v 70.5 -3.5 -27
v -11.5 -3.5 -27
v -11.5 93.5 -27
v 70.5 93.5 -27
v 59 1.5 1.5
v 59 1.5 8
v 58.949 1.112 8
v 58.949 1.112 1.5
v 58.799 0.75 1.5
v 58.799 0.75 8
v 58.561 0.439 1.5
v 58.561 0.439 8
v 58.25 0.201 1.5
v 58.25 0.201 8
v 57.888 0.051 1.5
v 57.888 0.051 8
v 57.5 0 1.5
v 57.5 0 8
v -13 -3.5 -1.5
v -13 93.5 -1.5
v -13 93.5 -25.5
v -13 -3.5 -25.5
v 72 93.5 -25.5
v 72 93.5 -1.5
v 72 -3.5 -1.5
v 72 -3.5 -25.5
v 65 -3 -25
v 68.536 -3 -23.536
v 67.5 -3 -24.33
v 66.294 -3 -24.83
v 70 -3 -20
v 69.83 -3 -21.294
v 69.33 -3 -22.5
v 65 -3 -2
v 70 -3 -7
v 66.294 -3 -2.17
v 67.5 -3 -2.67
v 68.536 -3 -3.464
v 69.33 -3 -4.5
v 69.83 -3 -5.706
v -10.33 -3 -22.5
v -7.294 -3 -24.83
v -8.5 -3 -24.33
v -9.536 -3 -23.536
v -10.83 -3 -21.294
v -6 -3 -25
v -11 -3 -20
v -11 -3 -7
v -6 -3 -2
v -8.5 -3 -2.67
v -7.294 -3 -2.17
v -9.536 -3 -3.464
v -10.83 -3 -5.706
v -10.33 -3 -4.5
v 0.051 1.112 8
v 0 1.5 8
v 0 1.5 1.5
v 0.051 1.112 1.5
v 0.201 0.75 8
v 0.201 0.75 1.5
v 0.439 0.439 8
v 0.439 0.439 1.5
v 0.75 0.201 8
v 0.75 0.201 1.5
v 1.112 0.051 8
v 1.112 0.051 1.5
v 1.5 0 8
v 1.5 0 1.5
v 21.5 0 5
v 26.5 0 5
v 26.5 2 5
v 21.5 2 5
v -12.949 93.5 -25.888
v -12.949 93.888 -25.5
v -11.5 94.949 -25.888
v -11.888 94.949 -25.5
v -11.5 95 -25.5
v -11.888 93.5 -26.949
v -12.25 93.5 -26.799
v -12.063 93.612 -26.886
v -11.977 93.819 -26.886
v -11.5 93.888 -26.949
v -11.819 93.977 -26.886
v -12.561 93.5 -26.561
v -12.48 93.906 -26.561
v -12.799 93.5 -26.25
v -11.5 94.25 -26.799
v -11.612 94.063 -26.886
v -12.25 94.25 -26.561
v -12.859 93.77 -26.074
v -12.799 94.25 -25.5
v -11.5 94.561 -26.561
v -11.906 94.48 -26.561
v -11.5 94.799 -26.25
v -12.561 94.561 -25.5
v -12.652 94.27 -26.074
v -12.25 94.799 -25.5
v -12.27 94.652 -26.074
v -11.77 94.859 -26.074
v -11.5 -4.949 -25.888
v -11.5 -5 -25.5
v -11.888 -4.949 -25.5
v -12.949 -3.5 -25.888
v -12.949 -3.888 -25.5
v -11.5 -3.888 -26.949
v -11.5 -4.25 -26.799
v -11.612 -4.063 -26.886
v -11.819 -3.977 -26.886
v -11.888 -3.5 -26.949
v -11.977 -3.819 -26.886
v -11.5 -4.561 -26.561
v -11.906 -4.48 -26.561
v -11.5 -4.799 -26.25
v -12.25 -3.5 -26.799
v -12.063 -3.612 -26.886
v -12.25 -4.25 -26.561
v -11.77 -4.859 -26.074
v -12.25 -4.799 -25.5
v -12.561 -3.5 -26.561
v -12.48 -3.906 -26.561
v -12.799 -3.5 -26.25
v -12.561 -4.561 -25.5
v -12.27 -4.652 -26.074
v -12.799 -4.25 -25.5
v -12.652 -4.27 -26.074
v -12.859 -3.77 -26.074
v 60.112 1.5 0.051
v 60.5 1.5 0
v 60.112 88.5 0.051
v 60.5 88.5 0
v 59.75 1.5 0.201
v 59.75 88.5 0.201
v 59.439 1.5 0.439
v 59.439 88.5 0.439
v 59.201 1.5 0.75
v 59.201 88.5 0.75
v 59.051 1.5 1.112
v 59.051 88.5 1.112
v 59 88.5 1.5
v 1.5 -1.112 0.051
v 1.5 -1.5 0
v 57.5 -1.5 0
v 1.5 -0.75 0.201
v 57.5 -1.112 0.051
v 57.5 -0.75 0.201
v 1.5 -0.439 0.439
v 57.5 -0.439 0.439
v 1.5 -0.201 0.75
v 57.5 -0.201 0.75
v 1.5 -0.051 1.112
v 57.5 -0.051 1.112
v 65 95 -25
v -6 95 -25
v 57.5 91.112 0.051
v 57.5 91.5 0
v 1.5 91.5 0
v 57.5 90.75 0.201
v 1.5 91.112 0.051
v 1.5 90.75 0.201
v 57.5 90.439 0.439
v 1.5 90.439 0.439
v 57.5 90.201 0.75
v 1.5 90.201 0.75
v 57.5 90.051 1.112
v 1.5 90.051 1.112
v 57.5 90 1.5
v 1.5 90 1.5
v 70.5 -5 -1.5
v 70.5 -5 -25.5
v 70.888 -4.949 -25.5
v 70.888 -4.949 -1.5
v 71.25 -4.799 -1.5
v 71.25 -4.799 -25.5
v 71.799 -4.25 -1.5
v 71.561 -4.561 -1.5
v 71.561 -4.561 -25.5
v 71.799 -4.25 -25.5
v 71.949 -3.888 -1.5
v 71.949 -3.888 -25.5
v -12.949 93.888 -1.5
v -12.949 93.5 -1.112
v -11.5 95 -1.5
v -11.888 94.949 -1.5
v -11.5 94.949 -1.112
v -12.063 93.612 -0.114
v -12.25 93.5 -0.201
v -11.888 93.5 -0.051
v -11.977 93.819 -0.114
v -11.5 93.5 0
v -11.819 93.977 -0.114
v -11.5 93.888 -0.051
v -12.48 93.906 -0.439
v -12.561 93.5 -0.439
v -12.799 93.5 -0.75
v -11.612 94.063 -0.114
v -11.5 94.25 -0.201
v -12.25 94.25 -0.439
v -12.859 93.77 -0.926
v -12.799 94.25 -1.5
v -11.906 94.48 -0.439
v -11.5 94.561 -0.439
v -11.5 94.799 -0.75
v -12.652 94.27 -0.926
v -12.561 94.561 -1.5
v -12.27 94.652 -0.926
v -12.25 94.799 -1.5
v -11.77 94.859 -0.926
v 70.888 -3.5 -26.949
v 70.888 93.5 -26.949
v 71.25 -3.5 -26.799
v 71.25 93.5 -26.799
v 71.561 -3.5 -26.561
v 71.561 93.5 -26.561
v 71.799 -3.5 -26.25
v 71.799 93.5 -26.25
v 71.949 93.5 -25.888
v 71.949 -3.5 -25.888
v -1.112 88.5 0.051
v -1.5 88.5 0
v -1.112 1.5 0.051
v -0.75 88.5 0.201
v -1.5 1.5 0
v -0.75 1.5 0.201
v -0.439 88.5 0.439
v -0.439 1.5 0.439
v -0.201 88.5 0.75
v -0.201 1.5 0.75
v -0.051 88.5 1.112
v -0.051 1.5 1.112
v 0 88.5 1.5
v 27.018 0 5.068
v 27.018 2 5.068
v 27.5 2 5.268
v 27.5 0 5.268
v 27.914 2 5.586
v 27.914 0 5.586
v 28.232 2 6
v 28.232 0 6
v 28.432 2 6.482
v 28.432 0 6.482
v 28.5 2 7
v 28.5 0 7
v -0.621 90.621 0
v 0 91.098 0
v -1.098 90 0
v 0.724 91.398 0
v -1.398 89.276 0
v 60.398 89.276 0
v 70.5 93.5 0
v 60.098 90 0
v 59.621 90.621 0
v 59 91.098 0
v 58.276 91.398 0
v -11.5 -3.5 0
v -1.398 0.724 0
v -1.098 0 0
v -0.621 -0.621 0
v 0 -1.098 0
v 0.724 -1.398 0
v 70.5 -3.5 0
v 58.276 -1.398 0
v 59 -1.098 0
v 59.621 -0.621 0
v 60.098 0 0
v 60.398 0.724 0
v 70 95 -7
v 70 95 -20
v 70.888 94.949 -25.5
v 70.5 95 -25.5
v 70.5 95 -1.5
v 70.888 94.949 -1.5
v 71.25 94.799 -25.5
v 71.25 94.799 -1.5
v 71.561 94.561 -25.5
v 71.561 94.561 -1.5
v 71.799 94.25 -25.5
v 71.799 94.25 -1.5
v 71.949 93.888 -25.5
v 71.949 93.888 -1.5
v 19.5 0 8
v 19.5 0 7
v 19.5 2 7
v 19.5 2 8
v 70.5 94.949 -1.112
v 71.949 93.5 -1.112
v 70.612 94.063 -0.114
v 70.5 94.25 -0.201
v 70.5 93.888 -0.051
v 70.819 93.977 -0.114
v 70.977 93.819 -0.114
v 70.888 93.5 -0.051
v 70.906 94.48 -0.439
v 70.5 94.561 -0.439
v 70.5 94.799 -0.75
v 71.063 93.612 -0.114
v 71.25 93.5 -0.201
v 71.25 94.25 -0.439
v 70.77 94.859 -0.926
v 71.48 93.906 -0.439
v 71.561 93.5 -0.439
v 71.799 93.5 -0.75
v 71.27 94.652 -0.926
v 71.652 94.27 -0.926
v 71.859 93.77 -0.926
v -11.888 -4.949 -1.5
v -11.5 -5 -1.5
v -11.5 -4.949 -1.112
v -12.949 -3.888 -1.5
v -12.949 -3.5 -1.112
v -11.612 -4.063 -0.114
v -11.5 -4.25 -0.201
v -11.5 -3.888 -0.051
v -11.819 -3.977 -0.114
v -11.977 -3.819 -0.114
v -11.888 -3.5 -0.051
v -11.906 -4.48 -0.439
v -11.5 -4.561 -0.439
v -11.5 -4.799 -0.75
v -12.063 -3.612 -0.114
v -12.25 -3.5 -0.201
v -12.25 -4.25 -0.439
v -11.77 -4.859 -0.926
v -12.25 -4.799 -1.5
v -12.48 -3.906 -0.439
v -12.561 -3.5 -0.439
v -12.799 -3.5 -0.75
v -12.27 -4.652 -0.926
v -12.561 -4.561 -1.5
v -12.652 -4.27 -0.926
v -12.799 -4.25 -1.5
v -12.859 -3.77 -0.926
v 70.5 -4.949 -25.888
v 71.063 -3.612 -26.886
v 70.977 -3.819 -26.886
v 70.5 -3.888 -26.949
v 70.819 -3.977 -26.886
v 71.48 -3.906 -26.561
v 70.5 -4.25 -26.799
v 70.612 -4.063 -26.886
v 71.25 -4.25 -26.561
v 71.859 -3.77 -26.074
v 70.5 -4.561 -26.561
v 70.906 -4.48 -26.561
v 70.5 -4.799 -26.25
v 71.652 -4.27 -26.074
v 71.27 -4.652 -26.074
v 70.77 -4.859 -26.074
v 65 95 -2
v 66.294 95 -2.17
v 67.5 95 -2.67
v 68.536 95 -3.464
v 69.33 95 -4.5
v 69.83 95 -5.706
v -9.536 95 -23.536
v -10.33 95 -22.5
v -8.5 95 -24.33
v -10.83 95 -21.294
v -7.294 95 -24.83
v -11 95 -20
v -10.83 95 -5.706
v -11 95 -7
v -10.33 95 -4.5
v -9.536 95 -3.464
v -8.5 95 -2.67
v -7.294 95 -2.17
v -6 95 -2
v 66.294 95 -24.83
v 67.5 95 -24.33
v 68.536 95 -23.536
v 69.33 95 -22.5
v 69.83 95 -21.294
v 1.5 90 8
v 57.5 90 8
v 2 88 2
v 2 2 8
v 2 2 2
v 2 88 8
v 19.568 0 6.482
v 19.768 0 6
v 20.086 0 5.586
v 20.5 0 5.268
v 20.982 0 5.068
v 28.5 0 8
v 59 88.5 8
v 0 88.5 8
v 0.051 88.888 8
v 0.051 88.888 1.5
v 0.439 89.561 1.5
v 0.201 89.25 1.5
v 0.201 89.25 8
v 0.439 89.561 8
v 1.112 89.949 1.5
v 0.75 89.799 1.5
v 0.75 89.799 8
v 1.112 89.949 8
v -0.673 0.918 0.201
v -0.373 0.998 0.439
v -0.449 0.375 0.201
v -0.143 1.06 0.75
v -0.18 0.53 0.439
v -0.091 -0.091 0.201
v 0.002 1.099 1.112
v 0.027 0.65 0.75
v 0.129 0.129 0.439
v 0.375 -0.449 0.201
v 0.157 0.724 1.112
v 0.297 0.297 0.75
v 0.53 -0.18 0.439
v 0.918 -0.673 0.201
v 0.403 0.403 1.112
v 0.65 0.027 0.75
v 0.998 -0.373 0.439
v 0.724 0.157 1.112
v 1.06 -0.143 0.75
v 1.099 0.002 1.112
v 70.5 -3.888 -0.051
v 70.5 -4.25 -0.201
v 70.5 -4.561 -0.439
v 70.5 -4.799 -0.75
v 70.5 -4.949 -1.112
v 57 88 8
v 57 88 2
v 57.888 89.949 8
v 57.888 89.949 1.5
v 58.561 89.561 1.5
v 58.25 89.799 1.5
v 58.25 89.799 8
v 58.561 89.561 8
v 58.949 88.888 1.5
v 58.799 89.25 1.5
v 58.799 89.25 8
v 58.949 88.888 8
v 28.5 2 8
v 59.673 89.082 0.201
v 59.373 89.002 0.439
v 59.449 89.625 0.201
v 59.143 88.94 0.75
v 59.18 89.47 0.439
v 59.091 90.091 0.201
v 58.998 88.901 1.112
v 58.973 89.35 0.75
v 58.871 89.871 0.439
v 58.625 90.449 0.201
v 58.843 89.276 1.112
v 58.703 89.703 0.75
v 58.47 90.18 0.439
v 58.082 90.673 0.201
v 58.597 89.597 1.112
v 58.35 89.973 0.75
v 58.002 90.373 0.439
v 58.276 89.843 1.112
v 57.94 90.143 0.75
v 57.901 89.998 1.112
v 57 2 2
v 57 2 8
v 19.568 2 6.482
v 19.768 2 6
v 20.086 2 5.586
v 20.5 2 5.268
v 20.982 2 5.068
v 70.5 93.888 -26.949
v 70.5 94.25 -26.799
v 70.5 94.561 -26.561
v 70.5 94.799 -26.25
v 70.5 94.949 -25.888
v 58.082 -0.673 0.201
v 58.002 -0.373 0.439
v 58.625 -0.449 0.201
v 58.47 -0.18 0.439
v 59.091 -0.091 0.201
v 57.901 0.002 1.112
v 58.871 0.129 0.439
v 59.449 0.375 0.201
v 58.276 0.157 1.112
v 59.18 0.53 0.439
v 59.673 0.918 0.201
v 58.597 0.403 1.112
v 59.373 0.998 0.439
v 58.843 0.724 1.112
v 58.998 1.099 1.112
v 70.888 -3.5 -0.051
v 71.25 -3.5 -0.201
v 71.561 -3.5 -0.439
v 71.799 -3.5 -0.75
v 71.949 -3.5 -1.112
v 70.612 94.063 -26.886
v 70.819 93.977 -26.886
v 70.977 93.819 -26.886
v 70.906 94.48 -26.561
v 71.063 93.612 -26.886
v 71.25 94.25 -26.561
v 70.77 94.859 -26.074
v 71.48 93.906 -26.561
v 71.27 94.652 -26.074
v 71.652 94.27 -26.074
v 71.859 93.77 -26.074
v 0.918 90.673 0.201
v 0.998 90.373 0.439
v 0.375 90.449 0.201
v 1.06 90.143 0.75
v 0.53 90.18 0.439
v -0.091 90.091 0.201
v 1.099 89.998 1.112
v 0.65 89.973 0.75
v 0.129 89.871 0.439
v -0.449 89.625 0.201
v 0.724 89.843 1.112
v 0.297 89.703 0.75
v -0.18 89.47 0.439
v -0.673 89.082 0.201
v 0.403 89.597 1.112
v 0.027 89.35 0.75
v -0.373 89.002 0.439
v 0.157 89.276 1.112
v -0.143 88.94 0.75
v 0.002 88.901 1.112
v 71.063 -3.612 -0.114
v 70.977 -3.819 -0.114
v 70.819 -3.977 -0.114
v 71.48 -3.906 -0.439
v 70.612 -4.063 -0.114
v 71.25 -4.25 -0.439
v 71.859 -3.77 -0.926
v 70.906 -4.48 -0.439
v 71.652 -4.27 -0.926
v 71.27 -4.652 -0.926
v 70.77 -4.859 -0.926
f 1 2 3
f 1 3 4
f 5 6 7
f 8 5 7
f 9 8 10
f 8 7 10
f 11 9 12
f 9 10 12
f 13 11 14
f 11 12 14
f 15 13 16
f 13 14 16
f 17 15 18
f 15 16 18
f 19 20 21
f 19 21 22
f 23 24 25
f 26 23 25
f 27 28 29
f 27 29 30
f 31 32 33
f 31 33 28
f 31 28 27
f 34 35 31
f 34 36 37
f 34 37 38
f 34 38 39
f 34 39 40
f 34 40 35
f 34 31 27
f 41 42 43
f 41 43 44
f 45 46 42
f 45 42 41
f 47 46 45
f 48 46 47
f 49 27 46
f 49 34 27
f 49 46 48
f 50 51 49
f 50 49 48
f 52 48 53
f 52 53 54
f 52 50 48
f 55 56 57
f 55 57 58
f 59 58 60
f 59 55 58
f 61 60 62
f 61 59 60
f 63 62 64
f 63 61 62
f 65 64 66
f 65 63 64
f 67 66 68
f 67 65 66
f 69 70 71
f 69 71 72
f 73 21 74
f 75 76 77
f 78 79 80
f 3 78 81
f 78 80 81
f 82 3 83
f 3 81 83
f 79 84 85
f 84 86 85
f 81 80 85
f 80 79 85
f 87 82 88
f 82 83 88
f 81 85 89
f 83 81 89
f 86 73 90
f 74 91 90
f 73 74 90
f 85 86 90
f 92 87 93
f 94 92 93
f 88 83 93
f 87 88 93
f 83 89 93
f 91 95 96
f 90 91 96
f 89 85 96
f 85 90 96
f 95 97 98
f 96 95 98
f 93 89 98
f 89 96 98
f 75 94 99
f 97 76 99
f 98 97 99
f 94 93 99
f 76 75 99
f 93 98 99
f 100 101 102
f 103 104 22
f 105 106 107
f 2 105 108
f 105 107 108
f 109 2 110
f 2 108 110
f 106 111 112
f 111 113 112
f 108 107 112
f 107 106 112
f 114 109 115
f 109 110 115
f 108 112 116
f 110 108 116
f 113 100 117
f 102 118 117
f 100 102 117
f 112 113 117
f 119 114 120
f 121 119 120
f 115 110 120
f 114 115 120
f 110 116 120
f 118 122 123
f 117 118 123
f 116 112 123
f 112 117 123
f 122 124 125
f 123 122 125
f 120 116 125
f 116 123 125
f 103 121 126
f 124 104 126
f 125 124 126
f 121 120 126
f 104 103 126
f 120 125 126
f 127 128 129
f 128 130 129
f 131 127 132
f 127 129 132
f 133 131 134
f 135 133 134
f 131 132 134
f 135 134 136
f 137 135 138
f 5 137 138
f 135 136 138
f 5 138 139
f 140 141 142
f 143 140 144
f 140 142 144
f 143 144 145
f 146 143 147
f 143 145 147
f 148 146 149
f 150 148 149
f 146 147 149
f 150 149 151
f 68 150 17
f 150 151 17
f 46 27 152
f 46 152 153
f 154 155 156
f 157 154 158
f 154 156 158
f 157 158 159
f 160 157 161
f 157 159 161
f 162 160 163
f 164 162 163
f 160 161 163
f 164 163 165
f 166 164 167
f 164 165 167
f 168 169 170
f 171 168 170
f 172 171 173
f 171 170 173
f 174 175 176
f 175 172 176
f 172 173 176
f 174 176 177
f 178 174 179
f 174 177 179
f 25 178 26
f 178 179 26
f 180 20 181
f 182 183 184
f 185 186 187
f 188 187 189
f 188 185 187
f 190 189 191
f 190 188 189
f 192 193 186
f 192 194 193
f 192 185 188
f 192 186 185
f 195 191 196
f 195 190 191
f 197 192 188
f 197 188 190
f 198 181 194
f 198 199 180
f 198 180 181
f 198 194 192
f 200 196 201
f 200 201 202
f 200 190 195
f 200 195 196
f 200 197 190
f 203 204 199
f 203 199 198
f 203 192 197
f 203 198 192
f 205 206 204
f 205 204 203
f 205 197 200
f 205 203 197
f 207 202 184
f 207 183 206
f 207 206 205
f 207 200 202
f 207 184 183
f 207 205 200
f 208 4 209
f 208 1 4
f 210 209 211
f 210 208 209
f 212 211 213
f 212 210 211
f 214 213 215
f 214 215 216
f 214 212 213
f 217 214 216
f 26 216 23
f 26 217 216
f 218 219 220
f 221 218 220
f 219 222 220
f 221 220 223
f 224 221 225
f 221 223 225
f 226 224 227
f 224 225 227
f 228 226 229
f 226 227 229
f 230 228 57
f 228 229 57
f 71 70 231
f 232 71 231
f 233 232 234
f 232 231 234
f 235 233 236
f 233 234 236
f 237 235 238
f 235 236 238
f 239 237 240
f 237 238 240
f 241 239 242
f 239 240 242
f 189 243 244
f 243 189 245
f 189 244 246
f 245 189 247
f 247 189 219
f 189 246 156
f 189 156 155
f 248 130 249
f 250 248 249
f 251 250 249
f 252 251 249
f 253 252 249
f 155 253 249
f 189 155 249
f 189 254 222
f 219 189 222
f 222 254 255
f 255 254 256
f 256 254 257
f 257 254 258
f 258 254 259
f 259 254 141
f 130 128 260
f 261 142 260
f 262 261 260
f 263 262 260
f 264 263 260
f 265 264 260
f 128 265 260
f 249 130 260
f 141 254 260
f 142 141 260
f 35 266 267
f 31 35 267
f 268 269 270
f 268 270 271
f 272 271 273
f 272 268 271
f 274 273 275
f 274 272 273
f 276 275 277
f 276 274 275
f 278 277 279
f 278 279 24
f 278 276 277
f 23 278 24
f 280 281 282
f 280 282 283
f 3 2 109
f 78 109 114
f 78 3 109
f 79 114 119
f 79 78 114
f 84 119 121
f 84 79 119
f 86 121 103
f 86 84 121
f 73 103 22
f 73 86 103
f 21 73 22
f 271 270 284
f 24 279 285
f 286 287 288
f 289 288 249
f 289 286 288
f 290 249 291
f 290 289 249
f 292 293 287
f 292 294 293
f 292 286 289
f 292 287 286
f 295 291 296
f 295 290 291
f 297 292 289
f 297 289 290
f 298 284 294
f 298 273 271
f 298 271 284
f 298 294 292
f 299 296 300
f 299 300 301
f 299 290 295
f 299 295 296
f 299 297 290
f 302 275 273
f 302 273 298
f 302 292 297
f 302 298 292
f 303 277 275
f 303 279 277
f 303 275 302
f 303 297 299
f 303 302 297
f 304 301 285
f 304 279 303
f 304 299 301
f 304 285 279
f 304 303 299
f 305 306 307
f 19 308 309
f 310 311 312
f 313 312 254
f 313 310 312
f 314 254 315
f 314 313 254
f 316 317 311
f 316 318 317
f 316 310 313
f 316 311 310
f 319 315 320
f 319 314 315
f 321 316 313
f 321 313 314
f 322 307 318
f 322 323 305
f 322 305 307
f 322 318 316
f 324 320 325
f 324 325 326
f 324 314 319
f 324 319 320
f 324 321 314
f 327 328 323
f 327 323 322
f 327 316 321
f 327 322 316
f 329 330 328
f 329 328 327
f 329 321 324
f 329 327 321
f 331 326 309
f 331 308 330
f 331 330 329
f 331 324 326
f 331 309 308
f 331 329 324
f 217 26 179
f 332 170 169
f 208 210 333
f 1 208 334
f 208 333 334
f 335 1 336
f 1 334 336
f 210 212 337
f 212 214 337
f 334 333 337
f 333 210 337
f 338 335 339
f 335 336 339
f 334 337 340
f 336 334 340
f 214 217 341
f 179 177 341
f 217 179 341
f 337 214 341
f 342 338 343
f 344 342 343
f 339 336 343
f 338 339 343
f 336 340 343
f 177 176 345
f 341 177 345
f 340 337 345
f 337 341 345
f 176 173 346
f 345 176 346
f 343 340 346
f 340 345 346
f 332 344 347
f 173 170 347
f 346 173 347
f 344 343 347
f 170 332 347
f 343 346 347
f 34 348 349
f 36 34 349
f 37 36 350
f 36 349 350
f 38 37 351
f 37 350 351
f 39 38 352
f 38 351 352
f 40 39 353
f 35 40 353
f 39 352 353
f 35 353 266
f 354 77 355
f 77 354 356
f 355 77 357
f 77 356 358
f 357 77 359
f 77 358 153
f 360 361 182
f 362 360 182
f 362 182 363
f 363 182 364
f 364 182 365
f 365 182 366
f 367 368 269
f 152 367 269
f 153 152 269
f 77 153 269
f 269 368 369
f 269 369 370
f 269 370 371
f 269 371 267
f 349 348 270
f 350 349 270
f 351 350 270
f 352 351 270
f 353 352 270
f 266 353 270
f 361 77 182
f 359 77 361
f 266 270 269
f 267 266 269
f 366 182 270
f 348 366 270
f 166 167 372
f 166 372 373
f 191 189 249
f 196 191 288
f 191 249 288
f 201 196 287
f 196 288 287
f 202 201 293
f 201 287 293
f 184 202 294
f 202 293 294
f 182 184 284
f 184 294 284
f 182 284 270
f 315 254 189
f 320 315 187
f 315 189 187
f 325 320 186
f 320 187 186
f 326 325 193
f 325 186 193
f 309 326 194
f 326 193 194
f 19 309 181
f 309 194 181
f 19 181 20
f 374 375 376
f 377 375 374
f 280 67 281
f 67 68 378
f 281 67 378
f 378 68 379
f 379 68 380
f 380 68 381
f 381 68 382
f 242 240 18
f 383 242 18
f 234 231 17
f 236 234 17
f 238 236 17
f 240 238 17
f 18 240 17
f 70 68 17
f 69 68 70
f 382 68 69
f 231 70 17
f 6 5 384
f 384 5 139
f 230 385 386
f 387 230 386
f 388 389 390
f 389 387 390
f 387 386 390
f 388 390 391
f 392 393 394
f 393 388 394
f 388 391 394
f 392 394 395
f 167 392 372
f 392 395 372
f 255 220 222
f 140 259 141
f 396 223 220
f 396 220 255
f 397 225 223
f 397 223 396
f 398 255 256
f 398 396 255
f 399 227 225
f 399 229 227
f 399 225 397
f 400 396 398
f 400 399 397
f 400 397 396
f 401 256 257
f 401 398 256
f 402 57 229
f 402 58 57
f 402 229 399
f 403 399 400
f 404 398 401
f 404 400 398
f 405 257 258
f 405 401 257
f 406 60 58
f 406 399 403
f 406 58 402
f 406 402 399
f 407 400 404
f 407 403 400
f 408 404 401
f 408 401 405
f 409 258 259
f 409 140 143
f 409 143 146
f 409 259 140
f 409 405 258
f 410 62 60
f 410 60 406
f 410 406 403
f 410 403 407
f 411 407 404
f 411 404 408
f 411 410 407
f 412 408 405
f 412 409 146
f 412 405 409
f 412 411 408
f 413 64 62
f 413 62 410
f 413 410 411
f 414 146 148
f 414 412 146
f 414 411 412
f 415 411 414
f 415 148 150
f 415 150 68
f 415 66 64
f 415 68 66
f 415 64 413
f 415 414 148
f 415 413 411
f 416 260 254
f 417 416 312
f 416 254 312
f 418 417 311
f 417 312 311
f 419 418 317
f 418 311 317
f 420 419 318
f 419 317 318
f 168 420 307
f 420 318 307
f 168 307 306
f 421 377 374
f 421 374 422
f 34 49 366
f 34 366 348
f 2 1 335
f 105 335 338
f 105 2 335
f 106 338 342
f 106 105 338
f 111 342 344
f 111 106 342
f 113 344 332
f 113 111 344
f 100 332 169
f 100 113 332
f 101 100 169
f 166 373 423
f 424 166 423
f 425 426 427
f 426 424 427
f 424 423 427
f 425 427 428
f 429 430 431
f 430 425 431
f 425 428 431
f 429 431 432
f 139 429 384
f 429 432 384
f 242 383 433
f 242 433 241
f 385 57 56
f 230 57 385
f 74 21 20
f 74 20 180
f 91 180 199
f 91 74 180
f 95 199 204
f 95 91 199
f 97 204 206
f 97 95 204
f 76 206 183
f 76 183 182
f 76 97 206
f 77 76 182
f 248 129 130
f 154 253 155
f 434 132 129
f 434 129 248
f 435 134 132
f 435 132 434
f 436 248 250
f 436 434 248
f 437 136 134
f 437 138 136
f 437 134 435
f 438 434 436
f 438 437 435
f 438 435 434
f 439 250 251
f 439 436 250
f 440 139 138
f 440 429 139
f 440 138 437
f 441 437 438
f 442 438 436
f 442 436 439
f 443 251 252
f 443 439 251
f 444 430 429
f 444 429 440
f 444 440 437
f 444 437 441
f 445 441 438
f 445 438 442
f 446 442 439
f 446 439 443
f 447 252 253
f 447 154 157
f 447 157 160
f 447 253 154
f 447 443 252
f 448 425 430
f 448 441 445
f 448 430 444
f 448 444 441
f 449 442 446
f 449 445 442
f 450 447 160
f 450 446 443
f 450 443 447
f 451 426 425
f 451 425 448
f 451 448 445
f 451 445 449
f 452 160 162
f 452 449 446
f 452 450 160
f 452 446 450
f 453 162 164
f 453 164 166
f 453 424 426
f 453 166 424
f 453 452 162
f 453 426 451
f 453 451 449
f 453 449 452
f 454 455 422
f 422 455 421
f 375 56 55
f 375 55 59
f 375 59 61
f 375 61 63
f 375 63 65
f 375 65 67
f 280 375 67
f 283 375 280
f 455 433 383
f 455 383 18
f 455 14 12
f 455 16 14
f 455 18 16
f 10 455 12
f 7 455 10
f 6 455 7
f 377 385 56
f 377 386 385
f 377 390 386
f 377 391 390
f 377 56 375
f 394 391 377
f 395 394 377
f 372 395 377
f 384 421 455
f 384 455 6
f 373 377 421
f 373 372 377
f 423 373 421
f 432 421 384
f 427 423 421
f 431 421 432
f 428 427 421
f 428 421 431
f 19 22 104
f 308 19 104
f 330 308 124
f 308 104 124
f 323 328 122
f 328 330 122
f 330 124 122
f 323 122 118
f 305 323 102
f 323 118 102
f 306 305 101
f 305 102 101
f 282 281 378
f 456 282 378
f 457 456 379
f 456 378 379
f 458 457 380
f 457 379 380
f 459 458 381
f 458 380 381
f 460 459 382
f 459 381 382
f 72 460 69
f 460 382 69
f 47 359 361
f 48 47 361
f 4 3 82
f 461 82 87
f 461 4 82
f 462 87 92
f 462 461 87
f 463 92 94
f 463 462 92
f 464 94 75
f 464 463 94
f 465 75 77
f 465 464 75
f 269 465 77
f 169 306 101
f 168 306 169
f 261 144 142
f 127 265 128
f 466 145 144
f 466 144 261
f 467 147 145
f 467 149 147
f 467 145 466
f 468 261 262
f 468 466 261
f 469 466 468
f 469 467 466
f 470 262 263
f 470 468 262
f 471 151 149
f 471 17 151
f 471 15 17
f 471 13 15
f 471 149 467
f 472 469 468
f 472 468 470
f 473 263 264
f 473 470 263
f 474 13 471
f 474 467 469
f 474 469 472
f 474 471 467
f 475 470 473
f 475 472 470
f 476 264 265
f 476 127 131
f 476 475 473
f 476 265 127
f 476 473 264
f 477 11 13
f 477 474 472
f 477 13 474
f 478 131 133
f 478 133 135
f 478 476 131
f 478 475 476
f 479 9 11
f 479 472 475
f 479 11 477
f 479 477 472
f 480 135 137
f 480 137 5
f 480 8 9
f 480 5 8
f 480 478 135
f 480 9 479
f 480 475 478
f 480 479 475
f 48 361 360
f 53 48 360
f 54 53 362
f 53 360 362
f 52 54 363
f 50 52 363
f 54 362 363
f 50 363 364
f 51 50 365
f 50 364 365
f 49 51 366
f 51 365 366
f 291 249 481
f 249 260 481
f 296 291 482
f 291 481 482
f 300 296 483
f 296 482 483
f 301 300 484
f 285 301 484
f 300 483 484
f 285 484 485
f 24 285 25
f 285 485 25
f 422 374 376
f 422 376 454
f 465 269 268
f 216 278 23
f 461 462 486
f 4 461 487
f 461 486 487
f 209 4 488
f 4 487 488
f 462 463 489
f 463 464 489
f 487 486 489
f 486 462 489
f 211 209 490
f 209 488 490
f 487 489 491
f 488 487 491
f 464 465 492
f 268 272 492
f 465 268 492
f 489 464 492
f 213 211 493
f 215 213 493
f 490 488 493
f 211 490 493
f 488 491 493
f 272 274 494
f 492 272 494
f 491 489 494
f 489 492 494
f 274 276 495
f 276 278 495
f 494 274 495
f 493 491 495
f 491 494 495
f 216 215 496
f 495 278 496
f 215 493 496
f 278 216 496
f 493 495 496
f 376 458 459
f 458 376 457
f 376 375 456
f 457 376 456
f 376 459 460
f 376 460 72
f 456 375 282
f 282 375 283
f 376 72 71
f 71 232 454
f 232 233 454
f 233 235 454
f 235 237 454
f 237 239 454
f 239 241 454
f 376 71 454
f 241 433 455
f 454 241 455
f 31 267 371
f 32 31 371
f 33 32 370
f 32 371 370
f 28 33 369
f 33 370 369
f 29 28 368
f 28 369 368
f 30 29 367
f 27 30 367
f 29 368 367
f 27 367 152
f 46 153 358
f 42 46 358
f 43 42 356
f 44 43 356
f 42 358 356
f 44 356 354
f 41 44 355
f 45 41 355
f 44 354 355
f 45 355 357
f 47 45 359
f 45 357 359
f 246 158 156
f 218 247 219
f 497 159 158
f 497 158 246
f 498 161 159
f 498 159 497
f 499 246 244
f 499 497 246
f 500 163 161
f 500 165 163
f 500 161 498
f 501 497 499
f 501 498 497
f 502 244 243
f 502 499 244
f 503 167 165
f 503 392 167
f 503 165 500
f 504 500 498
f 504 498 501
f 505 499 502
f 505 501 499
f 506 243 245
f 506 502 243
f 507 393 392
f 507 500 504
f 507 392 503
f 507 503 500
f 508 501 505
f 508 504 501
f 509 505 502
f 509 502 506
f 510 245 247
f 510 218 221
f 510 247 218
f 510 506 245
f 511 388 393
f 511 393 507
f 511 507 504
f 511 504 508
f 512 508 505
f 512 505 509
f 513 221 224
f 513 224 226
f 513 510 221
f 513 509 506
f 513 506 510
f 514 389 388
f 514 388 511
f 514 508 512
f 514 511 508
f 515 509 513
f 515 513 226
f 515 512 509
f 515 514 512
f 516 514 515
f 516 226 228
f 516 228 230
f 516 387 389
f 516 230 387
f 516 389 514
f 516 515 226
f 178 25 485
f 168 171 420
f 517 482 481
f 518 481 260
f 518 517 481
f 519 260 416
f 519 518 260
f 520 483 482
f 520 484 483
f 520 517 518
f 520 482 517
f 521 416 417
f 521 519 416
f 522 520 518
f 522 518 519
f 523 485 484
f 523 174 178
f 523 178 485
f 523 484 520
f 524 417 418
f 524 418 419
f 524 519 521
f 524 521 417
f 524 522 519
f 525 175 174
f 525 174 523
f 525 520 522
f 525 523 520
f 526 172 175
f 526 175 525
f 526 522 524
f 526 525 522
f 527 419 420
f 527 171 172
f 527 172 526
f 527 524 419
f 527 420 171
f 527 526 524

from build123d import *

# Parameters (mm, degrees)
BOX_W           = 59
BOX_H           = 90
BOX_DEPTH       = 8
SKETCH_W        = 55
SKETCH_H        = 86
POCKET_DEPTH    = 6
POCKET001_DEPTH = 2
SKETCH006_W     = 85
SKETCH006_H     = 100
PAD002_DEPTH    = 27
POCKET004_DEPTH = 98
FILLET_R        = 1.5
FILLET002_R     = 1.5


with BuildPart() as part:
    # Box → Box (join)
    with BuildSketch(Plane.XY):
        with Locations((29.5, 45)):
            Rectangle(BOX_W, BOX_H)
    extrude(amount=BOX_DEPTH)

    # Sketch (on Face6 of Box) → Pocket (cut)
    with BuildSketch(Plane.XY.offset(8)):
        with Locations((29.5, 45)):
            Rectangle(SKETCH_W, SKETCH_H)
    extrude(amount=-POCKET_DEPTH, mode=Mode.SUBTRACT)

    # Sketch001 (on Face2 of Pocket) → Pocket001 (cut)
    with BuildSketch(Plane.XZ):
        with BuildLine():
            Line((28.5, 8), (28.5, 7))
            ThreePointArc((26.5, 5), (27.914214, 5.585786), (28.5, 7))
            Line((26.5, 5), (21.5, 5))
            ThreePointArc((19.5, 7), (20.085786, 5.585786), (21.5, 5))
            Line((19.5, 7), (19.5, 8))
            Line((19.5, 8), (28.5, 8))
        make_face()
    extrude(amount=-POCKET001_DEPTH, mode=Mode.SUBTRACT)

    # Sketch006 (on Face5 of Pocket001) → Pad002 (join)
    with BuildSketch(Plane(origin=(0, 0, 0), x_dir=(1, 0, 0), z_dir=(0, 0, -1))):
        with Locations((29.5, -45)):
            Rectangle(SKETCH006_W, SKETCH006_H)
    extrude(amount=PAD002_DEPTH)

    # Sketch007 (on Face18 of Pad002) → Pocket004 (cut)
    with BuildSketch(Plane(origin=(0, 95, 0), x_dir=(-1, 0, 0), z_dir=(0, 1, 0))):
        with BuildLine():
            Line((-70, -7), (-70, -20))
            ThreePointArc((-70, -20), (-68.535534, -23.535534), (-65, -25))
            Line((-65, -25), (6, -25))
            ThreePointArc((6, -25), (9.535534, -23.535534), (11, -20))
            Line((11, -20), (11, -7))
            ThreePointArc((11, -7), (9.535534, -3.464466), (6, -2))
            Line((6, -2), (-65, -2))
            ThreePointArc((-65, -2), (-68.535534, -3.464466), (-70, -7))
        make_face()
    extrude(amount=-POCKET004_DEPTH, mode=Mode.SUBTRACT)

    # Fillet
    fillet_edges = [part.edges().sort_by_distance(p)[0] for p in [
        (0, 0, 4),
        (-13, -5, -13.5),
        (72, -5, -13.5),
        (59, 0, 4),
        (0, 90, 4),
        (-13, 95, -13.5),
        (59, 90, 4),
        (72, 95, -13.5),
    ]]
    fillet(fillet_edges, radius=FILLET_R)

    # Fillet002
    fillet002_edges = [part.edges().sort_by_distance(p)[0] for p in [
        (59, 45, 0),
        (72, 45, 0),
        (72, 45, -27),
    ]]
    fillet(fillet002_edges, radius=FILLET002_R)


solid = part.part
